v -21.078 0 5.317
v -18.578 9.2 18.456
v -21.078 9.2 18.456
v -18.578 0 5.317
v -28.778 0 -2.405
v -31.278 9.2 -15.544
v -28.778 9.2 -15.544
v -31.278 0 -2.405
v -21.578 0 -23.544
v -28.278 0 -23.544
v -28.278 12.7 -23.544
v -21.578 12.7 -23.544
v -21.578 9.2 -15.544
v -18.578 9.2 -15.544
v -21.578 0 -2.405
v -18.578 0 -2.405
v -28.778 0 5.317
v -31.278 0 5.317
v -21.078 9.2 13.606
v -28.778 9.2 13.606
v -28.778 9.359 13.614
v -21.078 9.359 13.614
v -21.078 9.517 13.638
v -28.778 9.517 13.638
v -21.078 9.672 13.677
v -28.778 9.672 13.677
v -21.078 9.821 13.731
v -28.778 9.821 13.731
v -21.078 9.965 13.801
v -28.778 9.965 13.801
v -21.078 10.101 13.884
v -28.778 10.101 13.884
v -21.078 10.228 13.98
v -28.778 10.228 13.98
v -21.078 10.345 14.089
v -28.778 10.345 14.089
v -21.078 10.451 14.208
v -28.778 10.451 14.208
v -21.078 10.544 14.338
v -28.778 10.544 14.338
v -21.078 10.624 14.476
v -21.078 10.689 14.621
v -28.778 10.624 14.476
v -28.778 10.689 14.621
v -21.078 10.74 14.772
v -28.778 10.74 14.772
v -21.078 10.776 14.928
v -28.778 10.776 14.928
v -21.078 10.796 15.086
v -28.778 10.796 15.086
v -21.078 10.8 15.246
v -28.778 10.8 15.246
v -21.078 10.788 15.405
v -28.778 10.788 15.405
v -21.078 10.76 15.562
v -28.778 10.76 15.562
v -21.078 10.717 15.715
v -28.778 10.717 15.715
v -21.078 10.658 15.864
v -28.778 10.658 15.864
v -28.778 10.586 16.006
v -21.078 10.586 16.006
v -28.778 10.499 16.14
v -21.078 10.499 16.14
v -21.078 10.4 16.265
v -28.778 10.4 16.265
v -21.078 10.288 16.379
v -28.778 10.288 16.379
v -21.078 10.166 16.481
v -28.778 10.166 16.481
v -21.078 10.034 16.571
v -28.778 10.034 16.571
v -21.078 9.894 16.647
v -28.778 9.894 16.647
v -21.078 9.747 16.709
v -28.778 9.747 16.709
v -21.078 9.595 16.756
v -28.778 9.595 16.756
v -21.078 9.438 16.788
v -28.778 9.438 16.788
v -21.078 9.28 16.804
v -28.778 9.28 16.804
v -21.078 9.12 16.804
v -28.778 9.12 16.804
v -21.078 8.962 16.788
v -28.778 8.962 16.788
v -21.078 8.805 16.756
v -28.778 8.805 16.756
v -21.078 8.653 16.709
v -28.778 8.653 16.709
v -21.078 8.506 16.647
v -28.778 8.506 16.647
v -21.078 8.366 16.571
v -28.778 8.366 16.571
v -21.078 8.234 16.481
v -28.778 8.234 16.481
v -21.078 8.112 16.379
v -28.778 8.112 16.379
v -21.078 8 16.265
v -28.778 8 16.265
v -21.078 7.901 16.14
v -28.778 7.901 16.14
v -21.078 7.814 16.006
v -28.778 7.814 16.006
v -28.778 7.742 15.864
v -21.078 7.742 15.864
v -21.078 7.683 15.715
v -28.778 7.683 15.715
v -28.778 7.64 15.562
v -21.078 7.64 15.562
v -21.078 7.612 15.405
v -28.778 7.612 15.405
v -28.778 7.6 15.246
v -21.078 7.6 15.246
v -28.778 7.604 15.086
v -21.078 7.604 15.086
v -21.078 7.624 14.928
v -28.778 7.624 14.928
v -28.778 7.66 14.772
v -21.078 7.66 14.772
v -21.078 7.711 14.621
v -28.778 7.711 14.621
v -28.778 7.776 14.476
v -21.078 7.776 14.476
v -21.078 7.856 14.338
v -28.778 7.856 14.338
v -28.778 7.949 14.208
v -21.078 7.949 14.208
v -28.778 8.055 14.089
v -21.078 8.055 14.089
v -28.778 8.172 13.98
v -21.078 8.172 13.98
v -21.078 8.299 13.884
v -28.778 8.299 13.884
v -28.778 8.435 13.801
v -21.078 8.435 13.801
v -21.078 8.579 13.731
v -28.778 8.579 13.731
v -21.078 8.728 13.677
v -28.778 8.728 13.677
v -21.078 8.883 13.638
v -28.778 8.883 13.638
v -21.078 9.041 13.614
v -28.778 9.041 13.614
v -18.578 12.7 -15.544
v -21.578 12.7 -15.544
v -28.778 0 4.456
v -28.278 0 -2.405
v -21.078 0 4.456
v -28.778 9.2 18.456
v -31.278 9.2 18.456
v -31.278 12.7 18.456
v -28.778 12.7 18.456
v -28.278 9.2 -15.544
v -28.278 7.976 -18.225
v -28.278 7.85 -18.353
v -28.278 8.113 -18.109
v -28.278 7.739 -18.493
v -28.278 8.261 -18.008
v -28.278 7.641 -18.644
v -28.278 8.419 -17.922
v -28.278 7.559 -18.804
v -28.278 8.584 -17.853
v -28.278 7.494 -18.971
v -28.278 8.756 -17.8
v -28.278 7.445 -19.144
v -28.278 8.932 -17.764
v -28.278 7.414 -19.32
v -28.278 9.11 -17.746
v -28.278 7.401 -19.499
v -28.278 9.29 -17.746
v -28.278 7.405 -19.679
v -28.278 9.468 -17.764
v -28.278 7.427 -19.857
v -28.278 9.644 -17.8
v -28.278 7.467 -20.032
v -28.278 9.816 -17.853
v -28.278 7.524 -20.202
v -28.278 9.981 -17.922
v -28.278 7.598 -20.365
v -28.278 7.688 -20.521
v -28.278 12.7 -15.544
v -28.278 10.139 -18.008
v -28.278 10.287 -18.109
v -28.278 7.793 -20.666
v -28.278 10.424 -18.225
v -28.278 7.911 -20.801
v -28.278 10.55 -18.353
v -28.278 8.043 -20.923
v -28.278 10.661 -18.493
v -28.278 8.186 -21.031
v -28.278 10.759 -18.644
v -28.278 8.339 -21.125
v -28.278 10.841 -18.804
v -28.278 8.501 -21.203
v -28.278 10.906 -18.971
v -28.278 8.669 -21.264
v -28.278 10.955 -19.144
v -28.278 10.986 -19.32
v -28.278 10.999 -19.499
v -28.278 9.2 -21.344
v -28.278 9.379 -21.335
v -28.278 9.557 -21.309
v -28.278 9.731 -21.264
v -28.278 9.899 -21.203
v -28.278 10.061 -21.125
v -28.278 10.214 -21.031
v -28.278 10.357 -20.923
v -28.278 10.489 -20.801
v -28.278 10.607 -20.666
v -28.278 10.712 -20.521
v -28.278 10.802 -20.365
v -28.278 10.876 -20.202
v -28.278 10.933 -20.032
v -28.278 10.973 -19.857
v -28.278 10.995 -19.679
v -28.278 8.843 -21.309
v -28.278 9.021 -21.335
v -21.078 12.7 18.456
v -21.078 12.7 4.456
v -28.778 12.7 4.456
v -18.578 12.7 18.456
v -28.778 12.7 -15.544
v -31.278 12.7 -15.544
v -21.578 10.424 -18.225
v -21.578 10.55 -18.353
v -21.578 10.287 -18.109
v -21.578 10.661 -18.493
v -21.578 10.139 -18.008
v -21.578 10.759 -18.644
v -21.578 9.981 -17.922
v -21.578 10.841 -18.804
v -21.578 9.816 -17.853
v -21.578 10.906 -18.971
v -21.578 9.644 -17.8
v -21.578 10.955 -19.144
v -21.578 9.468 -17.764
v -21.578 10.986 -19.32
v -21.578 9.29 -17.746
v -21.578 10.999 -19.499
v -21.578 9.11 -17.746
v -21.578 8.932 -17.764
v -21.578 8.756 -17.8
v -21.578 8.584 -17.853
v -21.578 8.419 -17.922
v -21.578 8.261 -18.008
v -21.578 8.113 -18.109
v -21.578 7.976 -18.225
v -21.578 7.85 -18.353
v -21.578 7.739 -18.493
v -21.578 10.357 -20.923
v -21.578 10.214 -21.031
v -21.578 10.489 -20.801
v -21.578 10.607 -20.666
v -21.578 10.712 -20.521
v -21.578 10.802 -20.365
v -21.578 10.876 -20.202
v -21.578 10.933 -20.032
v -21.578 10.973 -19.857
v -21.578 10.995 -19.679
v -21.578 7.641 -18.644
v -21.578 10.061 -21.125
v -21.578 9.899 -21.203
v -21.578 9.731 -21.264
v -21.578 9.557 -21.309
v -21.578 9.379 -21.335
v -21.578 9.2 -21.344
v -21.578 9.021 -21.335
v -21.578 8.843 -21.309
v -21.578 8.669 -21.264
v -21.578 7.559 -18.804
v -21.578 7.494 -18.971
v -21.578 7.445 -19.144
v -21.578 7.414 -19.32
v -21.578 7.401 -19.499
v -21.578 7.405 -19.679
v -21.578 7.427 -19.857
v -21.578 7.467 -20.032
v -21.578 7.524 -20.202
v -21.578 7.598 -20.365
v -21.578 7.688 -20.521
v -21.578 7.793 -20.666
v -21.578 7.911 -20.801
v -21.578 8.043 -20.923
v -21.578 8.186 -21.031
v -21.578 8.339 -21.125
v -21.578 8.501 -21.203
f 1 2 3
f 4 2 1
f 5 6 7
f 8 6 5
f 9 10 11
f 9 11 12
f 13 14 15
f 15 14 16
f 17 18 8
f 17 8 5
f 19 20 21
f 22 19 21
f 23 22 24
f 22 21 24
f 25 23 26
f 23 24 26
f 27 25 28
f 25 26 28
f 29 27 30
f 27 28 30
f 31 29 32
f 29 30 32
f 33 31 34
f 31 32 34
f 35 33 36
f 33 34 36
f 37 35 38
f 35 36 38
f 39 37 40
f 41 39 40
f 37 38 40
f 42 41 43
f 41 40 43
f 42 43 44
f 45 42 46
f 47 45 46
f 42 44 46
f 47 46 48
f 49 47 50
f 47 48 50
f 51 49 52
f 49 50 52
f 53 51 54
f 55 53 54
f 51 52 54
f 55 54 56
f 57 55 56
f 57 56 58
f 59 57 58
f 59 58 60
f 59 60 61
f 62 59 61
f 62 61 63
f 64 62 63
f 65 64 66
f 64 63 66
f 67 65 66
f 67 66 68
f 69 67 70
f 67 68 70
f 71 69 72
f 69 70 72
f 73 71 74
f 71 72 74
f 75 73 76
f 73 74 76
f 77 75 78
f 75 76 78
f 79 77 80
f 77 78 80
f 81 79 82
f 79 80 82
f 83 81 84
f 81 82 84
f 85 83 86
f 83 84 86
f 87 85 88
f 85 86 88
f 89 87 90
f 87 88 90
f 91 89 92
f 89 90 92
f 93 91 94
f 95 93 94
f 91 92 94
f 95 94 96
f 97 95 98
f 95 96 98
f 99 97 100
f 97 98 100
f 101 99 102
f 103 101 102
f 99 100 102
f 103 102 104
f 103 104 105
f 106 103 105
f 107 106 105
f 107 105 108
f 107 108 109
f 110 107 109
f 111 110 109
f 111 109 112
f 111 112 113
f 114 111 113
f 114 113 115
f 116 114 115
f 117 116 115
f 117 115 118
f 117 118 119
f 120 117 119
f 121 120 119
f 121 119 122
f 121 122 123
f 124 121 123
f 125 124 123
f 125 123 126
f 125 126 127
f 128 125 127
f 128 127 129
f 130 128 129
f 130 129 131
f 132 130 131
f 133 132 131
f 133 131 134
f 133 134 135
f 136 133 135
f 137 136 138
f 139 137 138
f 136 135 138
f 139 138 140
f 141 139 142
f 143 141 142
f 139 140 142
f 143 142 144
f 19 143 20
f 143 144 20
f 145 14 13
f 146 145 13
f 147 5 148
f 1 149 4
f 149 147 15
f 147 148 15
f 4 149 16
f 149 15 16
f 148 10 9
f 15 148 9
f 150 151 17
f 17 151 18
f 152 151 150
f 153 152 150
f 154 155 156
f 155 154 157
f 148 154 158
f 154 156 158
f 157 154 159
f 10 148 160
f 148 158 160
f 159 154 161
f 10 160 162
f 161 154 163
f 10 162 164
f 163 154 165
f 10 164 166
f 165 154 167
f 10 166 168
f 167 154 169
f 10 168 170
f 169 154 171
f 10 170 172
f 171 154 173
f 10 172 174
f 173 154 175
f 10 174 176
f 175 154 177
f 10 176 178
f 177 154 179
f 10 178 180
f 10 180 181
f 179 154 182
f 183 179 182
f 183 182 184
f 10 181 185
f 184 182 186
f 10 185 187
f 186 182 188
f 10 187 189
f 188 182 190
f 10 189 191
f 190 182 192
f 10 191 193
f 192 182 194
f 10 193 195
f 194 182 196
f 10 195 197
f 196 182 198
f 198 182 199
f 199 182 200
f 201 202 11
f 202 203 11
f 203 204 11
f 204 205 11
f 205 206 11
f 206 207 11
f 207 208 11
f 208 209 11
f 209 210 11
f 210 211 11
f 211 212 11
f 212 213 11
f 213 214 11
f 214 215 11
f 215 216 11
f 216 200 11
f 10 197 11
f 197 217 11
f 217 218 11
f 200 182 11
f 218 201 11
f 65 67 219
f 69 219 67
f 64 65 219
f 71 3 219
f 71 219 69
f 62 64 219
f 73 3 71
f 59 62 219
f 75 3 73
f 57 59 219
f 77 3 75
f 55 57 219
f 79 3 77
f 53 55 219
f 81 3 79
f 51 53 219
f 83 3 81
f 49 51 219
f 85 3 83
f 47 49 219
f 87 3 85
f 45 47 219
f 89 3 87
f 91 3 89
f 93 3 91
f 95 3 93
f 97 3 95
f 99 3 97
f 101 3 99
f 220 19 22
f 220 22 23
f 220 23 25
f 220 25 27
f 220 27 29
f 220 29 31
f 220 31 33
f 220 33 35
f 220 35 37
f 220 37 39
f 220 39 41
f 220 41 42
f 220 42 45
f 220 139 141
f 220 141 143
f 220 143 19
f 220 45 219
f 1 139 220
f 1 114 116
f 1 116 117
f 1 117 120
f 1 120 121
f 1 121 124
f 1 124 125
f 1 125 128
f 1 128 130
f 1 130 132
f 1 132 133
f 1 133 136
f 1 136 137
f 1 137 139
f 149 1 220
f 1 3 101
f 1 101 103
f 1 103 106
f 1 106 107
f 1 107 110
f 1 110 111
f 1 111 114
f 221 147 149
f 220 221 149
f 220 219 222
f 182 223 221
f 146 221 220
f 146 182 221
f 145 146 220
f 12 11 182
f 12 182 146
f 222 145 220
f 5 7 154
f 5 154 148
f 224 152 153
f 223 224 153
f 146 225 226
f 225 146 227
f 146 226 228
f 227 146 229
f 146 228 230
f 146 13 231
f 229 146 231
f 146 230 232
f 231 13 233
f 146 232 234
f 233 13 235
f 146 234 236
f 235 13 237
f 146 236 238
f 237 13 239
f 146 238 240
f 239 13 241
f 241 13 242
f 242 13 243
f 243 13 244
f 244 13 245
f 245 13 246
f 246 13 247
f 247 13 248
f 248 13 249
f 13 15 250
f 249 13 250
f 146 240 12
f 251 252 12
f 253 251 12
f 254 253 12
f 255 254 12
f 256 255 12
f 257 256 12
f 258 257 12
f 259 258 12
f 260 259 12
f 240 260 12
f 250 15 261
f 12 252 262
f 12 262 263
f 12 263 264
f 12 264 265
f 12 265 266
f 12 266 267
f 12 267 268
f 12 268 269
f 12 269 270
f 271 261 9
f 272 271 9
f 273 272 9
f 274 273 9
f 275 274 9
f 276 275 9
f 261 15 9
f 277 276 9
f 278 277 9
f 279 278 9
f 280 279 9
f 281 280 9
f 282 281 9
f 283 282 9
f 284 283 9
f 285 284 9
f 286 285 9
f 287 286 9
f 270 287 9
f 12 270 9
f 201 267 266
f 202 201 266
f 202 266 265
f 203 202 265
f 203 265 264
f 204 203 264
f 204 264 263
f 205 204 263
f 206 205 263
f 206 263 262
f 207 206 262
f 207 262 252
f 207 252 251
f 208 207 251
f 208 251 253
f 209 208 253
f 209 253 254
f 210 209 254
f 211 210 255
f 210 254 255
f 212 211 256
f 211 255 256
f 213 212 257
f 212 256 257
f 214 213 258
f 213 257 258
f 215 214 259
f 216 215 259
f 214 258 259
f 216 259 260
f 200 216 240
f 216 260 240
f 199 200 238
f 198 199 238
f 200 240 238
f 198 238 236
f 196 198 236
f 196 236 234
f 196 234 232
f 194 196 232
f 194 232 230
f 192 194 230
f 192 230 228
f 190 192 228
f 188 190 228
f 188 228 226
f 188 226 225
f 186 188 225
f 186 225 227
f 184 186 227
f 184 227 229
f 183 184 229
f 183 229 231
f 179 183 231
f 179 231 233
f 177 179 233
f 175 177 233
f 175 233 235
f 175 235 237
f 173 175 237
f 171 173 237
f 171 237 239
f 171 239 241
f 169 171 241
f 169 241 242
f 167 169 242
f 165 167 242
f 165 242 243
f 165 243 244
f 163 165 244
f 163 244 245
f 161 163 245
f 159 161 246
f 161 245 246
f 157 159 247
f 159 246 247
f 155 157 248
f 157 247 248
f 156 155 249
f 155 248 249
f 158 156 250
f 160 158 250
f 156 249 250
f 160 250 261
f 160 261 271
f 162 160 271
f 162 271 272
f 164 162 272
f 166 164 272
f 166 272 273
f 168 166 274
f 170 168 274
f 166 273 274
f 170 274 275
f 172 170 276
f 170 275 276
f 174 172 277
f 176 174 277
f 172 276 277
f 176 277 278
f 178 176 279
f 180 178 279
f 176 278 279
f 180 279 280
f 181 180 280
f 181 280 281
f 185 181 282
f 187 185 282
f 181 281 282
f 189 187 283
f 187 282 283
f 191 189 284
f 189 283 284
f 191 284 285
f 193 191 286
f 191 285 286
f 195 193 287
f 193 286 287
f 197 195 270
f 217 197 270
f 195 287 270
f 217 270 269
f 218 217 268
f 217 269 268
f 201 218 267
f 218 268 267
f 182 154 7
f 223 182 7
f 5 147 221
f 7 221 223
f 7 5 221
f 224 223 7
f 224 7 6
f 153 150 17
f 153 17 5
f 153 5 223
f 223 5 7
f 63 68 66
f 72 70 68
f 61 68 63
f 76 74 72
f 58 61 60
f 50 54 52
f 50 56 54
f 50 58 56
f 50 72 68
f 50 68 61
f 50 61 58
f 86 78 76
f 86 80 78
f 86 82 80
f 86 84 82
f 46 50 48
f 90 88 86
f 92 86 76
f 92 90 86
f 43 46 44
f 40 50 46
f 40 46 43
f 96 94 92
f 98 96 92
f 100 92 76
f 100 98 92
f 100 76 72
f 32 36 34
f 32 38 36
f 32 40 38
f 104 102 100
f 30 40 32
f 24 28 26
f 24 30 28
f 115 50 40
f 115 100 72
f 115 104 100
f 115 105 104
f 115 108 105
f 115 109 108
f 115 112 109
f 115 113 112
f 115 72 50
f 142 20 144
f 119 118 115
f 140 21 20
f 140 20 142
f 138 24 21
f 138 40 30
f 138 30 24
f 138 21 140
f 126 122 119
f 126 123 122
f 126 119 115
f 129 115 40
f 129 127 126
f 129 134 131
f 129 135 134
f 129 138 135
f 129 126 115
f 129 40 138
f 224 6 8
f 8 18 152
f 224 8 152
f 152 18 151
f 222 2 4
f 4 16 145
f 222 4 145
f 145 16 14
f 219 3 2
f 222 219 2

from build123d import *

# Parameters (mm, degrees)
BOSS_EXTRUDE1_DEPTH    = 12.7
SKETCH3_R              = 1.8
CUT_EXTRUDE1_DEPTH     = 42.157547255
BOSS_EXTRUDE4_REACH    = 64.236
BOSS_EXTRUDE4_START    = -21.07817965
SKETCH3_3_R            = 1.6
CUT_EXTRUDE19_DEPTH    = 3
SPLIT1_SURFACE_1_BACK  = 46.679
SPLIT1_SURFACE_1_DEPTH = 93.358
SPLIT1_SURFACE_2_BACK  = 46.679
SPLIT1_SURFACE_2_DEPTH = 93.358


with BuildPart() as part:
    # Sketch2 → Boss-Extrude1 (new body)
    with BuildSketch(Plane(origin=(0, 0, 0), x_dir=(1, 0, 0), z_dir=(0, 1, 0))):
        Polygon((-28.27817965, 15.54419618), (-31.27817965, 15.54419618), (-31.27817965, -18.45580382), (-28.77817965, -18.45580382), (-28.77817965, -4.45580382), (-21.07817965, -4.45580382), (-21.07817965, -18.45580382), (-18.57817965, -18.45580382), (-18.57817965, 15.54419618), (-21.57817965, 15.54419618), (-21.57817965, 23.54419618), (-28.27817965, 23.54419618), align=None)
    extrude(amount=BOSS_EXTRUDE1_DEPTH)

    # Sketch3 → Cut-Extrude1 (cut, through all)
    with BuildSketch(Plane(origin=(0, 0, 0), x_dir=(0, 0, -1), z_dir=(1, 0, 0))):
        with Locations((19.54419618, 9.2)):
            Circle(SKETCH3_R)
    extrude(amount=-CUT_EXTRUDE1_DEPTH, mode=Mode.SUBTRACT)

    # Sketch3<3> → Boss-Extrude4 (add, up to next)
    with BuildSketch(Plane(origin=(0, 0, 0), x_dir=(0, 0, -1), z_dir=(1, 0, 0)).offset(BOSS_EXTRUDE4_START), mode=Mode.PRIVATE) as boss_extrude4_sk1:
        with Locations((-15.20580382, 9.2)):
            Circle(SKETCH3_3_R)
    boss_extrude4_tool1 = extrude(boss_extrude4_sk1.sketch, amount=-BOSS_EXTRUDE4_REACH, mode=Mode.PRIVATE) - part.part
    add(boss_extrude4_tool1.solids().sort_by_distance((-21.07818, 9.2, 15.205804))[0])

    # Sketch38 → Cut-Extrude19 (cut)
    with BuildSketch(Plane(origin=(-18.57817965, 0, 0), x_dir=(0, 0, -1), z_dir=(1, 0, 0))):
        Polygon((2.405234518, 0), (15.54419618, 0), (15.54419618, 9.2), align=None)
        Polygon((-5.316842158, 0), (-18.45580382, 0), (-18.45580382, 9.2), align=None)
    cut_extrude19 = extrude(amount=-CUT_EXTRUDE19_DEPTH, mode=Mode.SUBTRACT)

    # Mirror10: Cut-Extrude19 across plane
    add(cut_extrude19.mirror(Plane.ZY.offset(24.92817965)), mode=Mode.SUBTRACT)


with BuildPart() as body_2:
    # Split1: the piece behind the surface
    add(part.part)
    # Split1 surface: a surface, the sketch's curves swept straight by 93.358 mm
    with BuildLine(Plane(origin=(0, 12.7, 0), x_dir=(1, 0, 0), z_dir=(0, 1, 0)).offset(-SPLIT1_SURFACE_1_BACK), mode=Mode.PRIVATE) as split1_surface_1_path:
        Line((-28.77817965, -18.45580382), (-28.77817965, 15.54419618))
    split1_surface_1 = Shell.extrude(split1_surface_1_path.wire(), (0 * SPLIT1_SURFACE_1_DEPTH, 1 * SPLIT1_SURFACE_1_DEPTH, 0 * SPLIT1_SURFACE_1_DEPTH))
    split(bisect_by=split1_surface_1, keep=Keep.BOTTOM)


with BuildPart() as part_1:
    add(part.part)

    # Split1: split by a surface, the side it looks to stays
    # Split1 surface: a surface, the sketch's curves swept straight by 93.358 mm
    with BuildLine(Plane(origin=(0, 12.7, 0), x_dir=(1, 0, 0), z_dir=(0, 1, 0)).offset(-SPLIT1_SURFACE_2_BACK), mode=Mode.PRIVATE) as split1_surface_2_path:
        Line((-28.77817965, -18.45580382), (-28.77817965, 15.54419618))
    split1_surface_2 = Shell.extrude(split1_surface_2_path.wire(), (0 * SPLIT1_SURFACE_2_DEPTH, 1 * SPLIT1_SURFACE_2_DEPTH, 0 * SPLIT1_SURFACE_2_DEPTH))
    split(bisect_by=split1_surface_2, keep=Keep.TOP)


solid = Compound([body_2.part, part_1.part])
